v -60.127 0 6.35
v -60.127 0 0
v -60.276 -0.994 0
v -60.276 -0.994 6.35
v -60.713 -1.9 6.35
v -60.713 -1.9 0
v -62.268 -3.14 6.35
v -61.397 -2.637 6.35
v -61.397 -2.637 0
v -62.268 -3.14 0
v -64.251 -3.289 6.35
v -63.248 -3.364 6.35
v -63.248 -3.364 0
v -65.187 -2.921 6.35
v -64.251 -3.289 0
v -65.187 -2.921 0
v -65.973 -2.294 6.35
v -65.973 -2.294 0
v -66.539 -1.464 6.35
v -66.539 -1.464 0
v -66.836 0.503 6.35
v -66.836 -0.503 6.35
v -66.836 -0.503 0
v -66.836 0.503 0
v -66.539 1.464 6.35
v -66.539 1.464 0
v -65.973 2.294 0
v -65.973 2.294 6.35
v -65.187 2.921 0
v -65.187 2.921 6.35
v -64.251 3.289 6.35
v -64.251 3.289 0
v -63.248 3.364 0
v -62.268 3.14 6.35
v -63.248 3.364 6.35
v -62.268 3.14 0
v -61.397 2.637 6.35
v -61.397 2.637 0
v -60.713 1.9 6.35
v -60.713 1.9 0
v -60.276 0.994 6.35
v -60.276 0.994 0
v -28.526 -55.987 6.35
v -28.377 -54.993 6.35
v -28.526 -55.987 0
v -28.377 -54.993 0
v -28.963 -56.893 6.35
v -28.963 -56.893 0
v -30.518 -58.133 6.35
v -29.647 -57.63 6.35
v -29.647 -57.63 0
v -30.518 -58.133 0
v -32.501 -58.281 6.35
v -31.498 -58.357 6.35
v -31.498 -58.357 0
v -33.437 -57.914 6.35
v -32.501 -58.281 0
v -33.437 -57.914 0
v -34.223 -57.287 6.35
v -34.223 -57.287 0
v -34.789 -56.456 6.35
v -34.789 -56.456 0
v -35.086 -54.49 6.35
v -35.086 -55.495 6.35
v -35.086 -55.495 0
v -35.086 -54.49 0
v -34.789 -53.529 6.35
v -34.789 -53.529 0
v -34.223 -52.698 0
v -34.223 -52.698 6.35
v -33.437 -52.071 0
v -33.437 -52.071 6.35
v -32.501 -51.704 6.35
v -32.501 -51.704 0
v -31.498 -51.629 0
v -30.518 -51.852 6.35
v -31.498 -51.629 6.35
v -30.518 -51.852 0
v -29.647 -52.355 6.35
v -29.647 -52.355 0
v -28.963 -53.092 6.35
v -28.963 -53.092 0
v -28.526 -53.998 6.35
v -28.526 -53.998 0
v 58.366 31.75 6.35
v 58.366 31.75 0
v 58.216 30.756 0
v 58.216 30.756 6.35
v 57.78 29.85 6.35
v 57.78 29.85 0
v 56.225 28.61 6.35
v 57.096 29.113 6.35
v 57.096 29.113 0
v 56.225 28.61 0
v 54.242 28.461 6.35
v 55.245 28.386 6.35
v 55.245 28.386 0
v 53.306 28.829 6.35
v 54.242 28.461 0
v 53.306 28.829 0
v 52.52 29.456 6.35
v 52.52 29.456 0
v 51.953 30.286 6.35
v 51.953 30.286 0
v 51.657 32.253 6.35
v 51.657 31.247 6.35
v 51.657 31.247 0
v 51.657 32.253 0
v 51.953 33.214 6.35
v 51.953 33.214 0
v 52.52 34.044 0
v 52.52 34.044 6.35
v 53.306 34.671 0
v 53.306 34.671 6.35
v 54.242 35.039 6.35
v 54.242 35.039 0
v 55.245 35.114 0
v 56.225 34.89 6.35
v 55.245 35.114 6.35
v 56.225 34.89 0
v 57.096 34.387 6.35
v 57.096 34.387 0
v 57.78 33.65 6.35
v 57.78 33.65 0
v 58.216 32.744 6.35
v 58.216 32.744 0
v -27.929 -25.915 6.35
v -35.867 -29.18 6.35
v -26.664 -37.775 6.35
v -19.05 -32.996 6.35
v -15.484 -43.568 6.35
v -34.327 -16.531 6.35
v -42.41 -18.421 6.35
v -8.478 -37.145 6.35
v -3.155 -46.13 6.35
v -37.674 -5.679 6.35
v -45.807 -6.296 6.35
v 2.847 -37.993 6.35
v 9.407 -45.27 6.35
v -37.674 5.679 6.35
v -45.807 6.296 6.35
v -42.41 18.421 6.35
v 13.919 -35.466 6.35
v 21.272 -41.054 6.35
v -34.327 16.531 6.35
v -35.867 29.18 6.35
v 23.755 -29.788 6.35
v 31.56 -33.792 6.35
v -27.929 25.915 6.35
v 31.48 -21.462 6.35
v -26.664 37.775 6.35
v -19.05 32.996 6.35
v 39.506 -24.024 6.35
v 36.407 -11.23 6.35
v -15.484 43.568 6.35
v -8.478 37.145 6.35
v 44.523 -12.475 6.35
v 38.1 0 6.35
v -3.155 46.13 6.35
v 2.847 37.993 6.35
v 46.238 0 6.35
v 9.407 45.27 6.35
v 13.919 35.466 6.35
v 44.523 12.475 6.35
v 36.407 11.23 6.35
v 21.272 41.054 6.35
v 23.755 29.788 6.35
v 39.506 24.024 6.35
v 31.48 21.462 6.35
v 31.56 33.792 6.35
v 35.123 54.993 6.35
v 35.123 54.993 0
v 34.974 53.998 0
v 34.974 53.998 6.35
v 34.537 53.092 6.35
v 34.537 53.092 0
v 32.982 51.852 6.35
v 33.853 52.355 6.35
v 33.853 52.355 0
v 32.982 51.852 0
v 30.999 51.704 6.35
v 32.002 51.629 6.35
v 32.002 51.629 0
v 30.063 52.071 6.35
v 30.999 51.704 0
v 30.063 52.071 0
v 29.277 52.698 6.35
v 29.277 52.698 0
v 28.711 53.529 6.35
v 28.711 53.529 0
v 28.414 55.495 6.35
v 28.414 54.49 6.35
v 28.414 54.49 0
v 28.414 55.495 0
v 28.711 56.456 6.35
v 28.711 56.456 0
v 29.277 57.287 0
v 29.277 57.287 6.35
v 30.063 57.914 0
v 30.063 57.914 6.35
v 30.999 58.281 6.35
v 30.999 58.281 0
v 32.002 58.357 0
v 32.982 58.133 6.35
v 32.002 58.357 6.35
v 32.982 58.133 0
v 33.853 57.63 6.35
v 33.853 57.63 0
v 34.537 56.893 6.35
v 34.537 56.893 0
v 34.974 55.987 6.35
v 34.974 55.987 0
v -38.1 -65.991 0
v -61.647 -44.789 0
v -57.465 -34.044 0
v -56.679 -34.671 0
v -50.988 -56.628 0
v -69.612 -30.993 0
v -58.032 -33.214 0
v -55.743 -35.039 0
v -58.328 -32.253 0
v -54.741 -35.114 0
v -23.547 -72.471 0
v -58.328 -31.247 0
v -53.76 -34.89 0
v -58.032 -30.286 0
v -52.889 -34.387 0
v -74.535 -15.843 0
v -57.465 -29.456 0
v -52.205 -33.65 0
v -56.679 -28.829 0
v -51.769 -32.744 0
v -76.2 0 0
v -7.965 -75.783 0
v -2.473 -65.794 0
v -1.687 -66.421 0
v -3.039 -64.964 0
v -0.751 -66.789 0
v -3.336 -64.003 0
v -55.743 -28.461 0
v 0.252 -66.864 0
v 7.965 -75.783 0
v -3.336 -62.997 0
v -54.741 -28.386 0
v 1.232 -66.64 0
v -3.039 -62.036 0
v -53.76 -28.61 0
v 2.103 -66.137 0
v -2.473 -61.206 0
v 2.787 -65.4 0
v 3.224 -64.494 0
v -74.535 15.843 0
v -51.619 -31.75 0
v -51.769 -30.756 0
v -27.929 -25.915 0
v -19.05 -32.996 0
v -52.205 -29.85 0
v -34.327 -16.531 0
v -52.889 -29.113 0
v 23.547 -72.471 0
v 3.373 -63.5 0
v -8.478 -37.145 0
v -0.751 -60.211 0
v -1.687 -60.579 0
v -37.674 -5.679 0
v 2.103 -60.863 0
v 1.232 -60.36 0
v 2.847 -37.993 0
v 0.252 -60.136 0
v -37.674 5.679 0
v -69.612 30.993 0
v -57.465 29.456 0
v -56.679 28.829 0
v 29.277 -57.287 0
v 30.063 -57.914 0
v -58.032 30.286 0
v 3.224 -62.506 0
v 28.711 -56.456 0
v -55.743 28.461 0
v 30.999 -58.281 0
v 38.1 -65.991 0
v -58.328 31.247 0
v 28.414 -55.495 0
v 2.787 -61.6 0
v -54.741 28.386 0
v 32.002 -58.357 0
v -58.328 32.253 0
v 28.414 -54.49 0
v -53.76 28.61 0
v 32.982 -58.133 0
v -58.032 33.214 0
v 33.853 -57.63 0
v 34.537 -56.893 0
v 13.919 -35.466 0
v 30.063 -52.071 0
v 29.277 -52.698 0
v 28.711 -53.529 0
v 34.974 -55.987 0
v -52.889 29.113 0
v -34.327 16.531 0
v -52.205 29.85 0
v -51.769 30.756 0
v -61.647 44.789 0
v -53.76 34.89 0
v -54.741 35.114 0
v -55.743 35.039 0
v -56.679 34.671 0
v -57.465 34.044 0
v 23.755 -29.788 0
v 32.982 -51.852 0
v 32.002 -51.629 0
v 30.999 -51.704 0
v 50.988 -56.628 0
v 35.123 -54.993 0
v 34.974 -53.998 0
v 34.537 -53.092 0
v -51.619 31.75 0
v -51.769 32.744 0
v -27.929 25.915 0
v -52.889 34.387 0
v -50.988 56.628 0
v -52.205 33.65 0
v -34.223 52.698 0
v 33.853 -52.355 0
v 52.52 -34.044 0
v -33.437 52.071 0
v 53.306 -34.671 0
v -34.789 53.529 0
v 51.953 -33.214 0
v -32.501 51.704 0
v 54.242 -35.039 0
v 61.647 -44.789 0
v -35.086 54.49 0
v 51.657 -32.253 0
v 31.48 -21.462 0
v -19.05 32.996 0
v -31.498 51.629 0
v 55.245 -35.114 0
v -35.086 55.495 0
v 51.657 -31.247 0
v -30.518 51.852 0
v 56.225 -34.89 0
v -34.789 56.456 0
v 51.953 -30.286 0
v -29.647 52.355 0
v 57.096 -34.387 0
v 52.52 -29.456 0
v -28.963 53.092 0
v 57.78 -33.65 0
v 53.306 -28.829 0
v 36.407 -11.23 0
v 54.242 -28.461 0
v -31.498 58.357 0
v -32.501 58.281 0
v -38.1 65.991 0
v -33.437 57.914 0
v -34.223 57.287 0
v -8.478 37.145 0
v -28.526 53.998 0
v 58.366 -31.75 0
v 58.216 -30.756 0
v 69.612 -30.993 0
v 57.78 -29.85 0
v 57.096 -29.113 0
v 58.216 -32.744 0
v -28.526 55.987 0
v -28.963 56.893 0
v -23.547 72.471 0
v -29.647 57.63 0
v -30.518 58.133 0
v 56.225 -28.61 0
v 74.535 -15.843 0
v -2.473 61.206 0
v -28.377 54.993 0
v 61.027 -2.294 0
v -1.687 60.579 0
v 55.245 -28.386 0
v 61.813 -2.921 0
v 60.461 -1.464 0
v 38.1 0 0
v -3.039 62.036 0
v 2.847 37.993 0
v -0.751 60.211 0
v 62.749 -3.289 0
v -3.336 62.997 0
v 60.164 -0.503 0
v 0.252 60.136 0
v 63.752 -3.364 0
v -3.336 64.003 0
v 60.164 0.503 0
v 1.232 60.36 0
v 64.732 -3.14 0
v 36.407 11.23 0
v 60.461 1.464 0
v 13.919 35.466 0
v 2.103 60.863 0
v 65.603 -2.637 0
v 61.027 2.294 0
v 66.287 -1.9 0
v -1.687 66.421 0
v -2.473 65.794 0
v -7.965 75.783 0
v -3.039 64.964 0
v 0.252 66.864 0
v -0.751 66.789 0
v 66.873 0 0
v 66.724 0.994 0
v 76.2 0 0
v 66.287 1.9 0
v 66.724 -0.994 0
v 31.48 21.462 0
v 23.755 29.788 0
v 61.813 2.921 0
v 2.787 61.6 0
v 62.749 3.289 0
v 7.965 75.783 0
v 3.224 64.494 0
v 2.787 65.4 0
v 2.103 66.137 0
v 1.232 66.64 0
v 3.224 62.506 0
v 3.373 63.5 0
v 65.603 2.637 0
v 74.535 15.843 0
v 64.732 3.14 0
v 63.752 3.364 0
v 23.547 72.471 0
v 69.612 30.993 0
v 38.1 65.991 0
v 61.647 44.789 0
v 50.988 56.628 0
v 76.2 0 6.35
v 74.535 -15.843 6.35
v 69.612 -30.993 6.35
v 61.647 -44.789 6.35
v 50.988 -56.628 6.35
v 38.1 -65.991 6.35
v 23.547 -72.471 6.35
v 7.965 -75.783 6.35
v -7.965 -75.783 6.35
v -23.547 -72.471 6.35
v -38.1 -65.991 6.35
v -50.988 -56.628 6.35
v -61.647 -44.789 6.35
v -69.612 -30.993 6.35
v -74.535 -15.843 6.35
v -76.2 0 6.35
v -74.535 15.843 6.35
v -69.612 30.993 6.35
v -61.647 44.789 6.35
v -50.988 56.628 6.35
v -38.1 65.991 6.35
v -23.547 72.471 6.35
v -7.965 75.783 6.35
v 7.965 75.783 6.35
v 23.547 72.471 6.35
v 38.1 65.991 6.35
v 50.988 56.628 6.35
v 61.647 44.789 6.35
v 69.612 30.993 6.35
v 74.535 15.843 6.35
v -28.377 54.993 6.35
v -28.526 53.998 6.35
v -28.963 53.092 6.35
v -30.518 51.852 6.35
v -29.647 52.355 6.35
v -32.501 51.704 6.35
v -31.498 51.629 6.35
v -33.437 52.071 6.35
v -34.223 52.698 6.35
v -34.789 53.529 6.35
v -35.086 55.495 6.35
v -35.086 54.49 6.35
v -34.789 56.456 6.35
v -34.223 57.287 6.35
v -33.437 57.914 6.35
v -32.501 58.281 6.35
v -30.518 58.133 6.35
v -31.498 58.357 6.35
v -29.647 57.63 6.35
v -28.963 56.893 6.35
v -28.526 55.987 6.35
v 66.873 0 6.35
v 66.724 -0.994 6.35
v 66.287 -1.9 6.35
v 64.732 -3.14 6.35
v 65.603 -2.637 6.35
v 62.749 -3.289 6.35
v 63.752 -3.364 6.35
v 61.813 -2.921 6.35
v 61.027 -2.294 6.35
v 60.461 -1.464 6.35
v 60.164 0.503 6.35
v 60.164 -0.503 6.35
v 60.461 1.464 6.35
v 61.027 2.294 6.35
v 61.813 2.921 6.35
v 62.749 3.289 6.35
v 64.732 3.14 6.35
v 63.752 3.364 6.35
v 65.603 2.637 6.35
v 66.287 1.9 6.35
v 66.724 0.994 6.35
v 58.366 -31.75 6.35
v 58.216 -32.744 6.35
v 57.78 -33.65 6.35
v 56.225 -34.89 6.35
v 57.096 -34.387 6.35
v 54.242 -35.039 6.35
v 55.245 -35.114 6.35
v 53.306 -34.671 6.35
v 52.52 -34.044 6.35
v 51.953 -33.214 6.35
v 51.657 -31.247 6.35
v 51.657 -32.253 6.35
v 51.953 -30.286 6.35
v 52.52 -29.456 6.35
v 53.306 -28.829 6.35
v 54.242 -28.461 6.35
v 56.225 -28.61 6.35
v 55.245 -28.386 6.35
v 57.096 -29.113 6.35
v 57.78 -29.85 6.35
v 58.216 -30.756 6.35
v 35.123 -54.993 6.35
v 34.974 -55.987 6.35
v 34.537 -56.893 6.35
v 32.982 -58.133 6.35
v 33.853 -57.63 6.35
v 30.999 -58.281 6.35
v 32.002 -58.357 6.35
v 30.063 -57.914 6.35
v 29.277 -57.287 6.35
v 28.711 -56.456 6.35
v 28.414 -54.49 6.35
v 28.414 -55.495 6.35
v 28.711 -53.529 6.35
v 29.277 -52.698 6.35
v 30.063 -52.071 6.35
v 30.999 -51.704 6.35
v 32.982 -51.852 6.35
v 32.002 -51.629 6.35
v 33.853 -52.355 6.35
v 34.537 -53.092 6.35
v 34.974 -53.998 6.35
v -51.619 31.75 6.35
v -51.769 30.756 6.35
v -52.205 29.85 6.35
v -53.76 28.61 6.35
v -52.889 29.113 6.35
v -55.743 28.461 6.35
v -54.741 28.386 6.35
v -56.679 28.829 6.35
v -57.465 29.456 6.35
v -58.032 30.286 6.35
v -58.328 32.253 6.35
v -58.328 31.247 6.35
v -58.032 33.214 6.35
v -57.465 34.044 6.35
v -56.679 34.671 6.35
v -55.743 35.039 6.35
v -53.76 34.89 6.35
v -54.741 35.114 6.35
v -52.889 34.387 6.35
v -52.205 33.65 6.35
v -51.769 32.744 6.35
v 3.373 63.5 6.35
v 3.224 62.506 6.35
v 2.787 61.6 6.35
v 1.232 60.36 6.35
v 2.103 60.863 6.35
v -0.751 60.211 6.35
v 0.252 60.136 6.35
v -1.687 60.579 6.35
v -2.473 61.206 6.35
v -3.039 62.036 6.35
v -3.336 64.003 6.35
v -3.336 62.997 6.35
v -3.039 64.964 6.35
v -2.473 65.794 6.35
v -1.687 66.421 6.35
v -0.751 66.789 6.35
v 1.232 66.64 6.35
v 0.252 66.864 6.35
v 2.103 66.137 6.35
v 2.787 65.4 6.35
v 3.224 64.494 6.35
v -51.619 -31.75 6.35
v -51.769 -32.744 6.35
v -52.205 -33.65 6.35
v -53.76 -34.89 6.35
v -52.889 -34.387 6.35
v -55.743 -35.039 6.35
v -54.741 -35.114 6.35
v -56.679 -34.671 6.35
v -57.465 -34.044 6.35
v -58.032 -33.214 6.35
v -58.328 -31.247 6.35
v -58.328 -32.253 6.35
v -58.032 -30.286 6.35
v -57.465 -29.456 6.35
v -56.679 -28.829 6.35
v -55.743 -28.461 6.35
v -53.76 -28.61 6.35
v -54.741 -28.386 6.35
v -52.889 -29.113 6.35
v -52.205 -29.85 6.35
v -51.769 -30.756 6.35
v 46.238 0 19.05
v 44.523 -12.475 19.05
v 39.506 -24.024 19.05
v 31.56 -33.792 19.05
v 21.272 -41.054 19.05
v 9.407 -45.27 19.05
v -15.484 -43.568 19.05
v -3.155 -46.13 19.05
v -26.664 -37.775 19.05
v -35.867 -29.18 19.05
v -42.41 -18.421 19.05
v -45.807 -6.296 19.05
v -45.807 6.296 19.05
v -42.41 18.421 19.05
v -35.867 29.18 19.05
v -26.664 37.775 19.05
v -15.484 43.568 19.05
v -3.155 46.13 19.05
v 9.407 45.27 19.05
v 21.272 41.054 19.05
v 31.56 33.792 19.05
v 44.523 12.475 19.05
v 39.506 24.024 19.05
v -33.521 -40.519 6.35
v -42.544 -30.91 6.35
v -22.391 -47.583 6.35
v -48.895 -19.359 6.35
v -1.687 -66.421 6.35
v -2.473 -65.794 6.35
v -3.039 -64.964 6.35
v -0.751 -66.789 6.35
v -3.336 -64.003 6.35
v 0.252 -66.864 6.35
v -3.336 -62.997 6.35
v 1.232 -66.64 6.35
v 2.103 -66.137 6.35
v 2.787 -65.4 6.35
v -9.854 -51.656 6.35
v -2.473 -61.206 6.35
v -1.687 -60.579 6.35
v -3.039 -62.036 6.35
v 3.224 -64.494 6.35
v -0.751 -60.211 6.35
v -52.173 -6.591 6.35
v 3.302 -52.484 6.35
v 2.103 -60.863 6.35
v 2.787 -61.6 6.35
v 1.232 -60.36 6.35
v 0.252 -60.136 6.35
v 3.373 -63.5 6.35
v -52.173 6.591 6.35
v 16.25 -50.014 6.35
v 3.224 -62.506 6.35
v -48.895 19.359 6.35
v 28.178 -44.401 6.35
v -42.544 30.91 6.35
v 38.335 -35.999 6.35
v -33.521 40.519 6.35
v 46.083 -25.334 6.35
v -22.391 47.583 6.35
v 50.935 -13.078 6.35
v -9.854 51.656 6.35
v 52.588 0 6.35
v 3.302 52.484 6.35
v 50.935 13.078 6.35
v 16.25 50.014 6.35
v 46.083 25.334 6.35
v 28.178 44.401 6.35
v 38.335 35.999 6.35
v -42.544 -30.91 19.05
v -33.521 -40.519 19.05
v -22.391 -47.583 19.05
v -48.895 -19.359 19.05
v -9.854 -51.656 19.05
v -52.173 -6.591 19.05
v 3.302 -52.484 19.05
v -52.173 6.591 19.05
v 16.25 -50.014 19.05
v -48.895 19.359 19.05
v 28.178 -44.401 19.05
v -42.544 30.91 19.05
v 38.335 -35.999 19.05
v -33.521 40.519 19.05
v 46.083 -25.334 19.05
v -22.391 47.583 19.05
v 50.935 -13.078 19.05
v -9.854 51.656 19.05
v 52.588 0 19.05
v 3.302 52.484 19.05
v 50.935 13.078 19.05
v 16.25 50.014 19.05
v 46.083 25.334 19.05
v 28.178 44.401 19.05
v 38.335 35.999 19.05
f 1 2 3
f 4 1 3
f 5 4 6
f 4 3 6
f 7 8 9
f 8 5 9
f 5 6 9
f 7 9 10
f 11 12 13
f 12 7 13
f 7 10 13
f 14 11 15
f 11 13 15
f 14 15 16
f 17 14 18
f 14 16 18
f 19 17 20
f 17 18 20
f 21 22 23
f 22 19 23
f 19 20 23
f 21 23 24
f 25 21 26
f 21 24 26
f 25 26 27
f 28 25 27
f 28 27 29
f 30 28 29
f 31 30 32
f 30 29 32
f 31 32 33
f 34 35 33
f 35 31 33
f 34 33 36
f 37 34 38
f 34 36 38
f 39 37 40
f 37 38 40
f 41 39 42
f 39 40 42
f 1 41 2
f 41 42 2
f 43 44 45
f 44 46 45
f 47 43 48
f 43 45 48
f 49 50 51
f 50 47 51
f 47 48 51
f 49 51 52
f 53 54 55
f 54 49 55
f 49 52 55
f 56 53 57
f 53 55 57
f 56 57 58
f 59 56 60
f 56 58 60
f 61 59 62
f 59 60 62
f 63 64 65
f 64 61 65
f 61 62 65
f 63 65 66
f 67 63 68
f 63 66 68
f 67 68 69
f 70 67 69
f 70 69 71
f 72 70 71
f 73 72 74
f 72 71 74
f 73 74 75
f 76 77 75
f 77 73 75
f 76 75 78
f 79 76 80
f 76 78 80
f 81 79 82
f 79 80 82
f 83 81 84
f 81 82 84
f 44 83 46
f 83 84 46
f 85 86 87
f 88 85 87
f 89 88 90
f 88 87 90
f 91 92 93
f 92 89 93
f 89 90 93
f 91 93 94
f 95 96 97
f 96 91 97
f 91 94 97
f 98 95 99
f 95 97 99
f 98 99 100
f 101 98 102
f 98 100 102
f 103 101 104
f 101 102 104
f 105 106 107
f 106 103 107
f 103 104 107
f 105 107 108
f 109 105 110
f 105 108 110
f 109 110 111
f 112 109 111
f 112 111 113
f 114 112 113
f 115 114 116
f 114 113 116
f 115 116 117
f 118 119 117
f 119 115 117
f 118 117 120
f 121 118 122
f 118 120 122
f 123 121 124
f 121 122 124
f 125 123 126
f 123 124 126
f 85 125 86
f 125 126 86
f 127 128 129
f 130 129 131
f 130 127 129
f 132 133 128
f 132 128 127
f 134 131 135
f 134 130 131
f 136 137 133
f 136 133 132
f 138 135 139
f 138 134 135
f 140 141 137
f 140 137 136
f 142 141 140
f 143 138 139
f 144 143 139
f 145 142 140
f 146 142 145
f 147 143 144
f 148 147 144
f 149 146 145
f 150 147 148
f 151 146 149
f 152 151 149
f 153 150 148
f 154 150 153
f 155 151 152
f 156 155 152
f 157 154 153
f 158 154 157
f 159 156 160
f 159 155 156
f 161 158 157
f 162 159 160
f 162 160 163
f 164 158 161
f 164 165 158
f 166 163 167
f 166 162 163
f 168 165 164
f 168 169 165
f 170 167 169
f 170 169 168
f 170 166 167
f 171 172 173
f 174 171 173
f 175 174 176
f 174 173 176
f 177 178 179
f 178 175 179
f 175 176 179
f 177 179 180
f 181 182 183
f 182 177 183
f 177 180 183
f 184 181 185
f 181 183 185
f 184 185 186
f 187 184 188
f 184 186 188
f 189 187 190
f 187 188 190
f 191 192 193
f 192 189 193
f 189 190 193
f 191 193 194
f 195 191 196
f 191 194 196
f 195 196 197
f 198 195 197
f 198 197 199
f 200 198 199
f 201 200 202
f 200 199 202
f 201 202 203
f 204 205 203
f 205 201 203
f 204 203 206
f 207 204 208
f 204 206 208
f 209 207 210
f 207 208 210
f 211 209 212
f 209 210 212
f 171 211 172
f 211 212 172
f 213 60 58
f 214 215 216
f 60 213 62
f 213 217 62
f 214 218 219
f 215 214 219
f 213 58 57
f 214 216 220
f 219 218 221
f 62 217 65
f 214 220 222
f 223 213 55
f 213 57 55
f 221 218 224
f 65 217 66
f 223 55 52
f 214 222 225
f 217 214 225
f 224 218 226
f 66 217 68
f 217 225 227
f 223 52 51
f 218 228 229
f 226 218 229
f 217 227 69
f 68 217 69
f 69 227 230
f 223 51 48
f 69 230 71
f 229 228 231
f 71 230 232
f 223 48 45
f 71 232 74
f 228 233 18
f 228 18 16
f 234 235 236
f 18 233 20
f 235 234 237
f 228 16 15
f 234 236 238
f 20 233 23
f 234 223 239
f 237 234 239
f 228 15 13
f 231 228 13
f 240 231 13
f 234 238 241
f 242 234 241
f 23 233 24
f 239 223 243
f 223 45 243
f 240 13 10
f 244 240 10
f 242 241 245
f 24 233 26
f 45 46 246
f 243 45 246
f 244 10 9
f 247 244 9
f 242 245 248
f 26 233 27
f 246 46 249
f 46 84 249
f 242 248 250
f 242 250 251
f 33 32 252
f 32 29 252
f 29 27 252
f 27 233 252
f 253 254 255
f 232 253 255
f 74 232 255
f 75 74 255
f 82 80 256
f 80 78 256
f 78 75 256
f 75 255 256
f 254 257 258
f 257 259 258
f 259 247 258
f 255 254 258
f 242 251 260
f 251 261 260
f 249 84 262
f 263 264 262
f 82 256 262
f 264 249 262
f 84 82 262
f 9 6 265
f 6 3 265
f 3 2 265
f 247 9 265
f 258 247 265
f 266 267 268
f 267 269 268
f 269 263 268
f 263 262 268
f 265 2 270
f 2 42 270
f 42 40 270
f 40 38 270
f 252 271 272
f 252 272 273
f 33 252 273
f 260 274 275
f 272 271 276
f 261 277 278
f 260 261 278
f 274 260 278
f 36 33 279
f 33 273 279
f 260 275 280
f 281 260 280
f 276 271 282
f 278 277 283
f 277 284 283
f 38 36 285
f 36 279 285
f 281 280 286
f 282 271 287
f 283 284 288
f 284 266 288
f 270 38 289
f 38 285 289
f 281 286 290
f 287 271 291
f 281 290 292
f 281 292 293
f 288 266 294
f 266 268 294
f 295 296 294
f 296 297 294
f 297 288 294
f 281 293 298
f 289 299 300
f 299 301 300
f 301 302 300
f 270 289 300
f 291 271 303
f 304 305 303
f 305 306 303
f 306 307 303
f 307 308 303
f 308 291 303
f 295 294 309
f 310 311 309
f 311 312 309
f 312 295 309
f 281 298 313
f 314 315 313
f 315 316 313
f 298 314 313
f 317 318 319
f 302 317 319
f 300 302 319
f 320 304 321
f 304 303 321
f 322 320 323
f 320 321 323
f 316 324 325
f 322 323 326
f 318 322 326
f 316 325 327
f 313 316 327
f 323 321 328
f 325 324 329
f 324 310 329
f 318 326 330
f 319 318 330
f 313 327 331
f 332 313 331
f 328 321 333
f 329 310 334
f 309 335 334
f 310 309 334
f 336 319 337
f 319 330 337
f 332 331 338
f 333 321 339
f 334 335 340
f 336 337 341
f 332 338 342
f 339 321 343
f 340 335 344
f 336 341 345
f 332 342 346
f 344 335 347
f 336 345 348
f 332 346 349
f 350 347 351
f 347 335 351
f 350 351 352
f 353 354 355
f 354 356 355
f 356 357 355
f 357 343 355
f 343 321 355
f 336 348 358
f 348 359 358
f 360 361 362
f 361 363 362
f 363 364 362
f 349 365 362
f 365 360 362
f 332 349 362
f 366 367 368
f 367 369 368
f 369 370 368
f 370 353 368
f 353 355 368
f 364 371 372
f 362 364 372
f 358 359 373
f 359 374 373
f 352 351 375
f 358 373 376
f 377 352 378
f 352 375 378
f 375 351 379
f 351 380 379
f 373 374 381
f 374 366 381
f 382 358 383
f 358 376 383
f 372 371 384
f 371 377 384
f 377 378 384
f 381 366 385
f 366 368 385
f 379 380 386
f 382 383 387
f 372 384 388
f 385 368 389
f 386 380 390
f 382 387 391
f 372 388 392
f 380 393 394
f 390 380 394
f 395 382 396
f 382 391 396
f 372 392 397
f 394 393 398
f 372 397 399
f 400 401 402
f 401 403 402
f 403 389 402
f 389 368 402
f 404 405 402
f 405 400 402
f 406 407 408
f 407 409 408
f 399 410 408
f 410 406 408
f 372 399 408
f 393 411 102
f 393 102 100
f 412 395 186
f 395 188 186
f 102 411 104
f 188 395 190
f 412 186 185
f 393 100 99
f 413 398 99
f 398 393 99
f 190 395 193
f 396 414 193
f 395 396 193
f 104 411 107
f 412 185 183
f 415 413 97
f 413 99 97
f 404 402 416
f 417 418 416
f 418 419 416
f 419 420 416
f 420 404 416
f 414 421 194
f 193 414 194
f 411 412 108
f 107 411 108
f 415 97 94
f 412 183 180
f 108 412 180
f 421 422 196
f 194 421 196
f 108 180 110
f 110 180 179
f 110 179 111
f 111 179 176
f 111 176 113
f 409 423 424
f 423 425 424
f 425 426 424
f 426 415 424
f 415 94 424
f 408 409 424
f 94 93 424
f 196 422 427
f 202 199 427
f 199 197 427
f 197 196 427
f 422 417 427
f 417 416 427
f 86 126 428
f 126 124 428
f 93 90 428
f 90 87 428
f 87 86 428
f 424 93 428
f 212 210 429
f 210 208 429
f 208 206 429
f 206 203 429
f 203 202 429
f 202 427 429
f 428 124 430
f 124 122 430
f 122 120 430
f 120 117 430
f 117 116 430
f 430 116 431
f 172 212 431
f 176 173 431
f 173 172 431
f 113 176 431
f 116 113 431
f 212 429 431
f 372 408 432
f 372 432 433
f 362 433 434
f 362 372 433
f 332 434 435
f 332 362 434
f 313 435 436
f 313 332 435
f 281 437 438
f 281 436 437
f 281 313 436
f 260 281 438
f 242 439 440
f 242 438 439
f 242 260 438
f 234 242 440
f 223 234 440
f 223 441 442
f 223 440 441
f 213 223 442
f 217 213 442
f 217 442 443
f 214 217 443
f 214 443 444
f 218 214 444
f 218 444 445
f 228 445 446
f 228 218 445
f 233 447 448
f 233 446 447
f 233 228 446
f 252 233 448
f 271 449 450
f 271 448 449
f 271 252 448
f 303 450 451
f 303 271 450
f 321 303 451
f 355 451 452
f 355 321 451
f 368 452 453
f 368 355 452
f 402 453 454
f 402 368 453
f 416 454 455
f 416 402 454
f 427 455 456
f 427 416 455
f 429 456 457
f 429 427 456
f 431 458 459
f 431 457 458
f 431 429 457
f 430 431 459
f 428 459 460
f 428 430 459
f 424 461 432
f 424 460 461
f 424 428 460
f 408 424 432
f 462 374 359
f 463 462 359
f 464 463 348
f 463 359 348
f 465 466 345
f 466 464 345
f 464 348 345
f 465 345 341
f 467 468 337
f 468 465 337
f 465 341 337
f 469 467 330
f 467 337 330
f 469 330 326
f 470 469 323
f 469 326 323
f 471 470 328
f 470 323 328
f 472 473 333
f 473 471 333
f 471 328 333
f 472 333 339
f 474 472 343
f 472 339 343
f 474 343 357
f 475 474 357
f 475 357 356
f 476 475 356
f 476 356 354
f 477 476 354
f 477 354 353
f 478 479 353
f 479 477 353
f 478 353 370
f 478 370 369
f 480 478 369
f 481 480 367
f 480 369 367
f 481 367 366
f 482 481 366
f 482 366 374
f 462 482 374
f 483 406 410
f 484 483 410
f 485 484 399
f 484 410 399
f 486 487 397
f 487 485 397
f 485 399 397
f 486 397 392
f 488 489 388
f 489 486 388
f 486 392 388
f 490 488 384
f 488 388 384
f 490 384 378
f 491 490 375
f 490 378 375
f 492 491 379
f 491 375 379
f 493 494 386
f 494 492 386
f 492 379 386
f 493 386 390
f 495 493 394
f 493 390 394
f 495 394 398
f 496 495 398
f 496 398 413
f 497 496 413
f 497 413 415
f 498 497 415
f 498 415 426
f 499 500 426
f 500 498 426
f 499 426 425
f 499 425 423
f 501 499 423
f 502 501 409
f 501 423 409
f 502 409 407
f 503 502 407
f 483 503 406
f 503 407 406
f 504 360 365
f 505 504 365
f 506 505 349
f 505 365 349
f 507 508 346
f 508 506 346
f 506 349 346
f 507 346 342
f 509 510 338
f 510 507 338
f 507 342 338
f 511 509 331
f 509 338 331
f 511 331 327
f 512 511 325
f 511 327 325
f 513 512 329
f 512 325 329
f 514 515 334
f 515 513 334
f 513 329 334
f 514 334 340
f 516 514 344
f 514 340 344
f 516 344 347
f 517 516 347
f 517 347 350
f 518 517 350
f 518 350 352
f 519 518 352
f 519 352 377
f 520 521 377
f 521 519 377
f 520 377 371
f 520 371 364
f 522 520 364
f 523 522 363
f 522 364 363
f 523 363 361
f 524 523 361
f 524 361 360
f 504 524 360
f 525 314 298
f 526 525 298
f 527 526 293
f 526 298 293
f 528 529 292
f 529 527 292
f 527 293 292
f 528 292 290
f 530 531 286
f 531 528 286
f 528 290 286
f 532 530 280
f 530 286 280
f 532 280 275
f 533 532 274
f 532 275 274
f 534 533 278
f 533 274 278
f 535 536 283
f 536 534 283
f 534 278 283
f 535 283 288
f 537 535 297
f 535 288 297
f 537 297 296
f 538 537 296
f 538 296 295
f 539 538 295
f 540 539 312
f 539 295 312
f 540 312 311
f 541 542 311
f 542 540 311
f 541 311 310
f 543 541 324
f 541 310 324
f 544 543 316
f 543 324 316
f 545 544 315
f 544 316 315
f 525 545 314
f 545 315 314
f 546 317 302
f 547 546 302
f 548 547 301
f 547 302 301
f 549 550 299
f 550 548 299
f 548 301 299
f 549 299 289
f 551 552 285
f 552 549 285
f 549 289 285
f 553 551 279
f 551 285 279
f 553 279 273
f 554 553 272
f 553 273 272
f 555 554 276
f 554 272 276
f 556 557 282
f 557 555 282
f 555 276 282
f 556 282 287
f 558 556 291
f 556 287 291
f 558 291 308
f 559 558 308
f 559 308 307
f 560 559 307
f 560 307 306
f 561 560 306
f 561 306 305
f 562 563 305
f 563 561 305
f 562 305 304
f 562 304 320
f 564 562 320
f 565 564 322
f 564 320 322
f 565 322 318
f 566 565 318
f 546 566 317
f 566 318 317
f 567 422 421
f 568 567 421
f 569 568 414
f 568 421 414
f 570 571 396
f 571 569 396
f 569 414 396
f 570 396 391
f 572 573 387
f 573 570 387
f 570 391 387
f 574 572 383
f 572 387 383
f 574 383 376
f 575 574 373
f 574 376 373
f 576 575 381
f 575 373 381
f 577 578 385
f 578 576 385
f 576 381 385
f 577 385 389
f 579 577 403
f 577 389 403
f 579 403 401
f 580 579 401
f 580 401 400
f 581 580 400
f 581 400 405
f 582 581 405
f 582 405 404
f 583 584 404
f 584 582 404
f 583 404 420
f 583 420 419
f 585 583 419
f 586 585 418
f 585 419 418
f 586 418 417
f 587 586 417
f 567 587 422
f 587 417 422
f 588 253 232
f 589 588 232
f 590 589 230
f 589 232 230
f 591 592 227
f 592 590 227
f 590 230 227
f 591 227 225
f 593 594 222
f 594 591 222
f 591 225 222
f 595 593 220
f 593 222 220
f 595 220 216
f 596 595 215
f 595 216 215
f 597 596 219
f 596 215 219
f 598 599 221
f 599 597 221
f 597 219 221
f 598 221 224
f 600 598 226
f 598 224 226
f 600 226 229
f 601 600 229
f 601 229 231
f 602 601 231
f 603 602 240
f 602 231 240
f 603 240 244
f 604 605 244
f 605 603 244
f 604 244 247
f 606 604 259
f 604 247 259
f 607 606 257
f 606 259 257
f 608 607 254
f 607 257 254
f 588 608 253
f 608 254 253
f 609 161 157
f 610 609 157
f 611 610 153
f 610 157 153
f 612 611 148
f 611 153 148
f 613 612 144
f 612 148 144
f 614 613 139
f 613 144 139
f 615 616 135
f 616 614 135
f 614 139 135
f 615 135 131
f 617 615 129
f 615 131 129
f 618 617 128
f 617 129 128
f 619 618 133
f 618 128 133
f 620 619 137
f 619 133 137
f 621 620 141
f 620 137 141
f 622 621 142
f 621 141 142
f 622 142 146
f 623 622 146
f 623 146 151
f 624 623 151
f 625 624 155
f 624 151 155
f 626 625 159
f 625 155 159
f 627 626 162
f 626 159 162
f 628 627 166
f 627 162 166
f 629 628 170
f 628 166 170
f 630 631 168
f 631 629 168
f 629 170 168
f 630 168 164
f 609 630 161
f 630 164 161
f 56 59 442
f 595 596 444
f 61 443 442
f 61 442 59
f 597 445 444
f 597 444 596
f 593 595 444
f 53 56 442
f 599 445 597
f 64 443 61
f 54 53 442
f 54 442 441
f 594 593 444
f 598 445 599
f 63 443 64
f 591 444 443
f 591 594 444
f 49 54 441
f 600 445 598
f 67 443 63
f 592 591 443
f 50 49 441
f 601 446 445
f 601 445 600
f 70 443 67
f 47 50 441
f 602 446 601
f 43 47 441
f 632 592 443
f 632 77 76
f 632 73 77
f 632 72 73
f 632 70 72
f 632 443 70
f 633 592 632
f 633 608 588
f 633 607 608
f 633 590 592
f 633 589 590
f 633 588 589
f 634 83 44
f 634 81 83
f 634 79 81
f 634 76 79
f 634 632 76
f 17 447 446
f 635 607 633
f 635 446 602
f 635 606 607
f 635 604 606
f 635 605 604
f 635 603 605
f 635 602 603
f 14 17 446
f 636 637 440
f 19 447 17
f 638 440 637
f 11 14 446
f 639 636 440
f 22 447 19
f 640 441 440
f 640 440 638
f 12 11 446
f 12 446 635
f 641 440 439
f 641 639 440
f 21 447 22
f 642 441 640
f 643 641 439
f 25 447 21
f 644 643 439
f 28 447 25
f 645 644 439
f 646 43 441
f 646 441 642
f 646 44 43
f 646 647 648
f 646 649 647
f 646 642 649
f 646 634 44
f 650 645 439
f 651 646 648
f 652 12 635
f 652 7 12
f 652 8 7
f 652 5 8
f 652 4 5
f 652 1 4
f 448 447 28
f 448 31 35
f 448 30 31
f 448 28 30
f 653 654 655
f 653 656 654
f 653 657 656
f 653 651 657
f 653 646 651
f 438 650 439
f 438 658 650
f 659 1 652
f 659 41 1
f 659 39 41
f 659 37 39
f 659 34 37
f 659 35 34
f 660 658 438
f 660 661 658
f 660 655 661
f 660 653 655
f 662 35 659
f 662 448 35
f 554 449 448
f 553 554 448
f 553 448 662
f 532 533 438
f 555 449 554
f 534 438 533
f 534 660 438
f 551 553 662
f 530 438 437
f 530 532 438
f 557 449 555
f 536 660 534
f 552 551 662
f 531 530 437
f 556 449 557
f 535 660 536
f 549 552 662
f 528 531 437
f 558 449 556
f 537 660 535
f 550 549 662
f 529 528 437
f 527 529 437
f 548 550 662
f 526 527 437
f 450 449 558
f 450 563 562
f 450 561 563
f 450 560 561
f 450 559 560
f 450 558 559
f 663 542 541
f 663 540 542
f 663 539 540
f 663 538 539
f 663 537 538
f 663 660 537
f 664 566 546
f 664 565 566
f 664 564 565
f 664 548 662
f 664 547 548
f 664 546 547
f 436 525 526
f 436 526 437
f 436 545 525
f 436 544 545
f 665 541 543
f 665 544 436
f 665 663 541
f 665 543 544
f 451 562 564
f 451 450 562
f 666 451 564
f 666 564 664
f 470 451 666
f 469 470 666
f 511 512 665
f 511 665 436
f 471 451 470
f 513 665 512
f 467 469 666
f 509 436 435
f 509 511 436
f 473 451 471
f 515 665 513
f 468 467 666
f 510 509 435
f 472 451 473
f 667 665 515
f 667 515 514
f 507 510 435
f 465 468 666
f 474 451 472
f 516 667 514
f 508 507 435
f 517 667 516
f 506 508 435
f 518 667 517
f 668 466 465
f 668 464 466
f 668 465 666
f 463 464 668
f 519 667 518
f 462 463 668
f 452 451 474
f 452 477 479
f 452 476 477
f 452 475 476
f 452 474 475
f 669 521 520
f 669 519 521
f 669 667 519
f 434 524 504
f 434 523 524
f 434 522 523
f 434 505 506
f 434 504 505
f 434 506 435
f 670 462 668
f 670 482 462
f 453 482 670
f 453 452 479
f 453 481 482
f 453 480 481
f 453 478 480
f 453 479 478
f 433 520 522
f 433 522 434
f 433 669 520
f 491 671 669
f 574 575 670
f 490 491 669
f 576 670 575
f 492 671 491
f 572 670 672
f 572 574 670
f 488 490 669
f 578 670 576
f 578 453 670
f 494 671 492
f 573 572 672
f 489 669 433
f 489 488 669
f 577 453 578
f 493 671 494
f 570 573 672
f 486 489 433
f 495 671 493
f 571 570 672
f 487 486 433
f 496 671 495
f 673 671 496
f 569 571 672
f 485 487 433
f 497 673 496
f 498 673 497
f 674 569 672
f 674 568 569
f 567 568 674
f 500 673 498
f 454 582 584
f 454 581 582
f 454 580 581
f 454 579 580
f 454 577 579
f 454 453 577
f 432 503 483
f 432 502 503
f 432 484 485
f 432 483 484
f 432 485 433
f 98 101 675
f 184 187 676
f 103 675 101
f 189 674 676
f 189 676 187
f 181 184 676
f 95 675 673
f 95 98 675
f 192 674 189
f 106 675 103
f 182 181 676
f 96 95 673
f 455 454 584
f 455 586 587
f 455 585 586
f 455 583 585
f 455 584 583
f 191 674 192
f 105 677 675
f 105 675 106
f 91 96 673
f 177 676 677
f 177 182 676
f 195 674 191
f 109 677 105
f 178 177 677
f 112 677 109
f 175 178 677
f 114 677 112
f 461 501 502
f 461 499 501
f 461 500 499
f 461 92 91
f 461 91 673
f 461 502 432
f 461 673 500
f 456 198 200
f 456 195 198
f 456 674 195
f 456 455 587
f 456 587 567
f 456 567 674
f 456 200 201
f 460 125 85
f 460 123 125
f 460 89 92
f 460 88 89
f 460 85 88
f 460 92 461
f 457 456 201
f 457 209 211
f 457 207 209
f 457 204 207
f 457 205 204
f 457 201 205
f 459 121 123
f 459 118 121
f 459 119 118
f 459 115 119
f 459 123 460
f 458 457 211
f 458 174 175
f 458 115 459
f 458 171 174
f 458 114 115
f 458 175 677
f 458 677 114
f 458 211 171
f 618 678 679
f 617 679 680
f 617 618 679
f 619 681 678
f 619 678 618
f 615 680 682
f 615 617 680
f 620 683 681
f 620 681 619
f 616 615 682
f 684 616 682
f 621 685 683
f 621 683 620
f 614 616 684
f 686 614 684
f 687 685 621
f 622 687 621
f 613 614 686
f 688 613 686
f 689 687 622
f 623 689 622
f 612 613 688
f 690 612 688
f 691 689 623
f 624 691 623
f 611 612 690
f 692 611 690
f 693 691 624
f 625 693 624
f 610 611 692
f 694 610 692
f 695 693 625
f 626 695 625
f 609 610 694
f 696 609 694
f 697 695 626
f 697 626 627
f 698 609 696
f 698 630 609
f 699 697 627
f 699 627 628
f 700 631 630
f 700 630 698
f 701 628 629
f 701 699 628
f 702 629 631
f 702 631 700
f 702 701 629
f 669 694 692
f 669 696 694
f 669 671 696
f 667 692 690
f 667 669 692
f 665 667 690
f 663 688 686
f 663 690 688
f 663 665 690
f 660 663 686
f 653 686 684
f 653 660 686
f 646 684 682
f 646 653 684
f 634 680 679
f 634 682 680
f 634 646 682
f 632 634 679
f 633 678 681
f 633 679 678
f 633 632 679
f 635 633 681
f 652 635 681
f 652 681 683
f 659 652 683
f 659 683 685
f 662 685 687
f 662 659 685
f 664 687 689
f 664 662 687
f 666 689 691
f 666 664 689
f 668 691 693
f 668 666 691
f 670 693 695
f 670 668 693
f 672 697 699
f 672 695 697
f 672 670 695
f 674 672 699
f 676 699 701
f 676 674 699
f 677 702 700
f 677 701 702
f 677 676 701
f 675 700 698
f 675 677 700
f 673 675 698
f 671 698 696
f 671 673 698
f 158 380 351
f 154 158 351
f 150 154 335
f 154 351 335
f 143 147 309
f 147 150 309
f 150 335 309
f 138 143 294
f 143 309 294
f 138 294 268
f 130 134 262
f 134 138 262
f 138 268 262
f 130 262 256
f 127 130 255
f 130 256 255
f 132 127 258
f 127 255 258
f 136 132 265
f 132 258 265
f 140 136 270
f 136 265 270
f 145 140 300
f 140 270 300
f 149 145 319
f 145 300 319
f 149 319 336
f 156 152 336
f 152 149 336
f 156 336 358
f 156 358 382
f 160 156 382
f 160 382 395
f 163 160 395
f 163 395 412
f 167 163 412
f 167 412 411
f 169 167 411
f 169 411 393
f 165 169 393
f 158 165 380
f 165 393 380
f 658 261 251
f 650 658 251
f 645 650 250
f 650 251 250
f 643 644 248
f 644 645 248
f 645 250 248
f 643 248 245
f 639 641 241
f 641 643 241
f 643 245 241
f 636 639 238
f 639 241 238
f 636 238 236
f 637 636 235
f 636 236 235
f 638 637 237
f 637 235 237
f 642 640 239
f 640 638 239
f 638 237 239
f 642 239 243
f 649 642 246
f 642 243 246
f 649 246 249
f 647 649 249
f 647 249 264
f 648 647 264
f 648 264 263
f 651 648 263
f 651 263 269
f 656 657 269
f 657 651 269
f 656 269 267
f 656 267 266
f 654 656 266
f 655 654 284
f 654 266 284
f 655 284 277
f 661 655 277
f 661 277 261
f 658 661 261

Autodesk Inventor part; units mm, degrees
ref_plane "YZ Plane" through (0, 0, 0) normal (1, 0, 0) x (0, 1, 0)
ref_plane "XZ Plane" through (0, 0, 0) normal (0, 1, 0) x (-1, 0, 0)
ref_plane "XY Plane" through (0, 0, 0) normal (0, 0, 1) x (1, 0, 0)
sketch "Sketch1" plane through (0, 0, 0) normal (0, 0, 1) x (1, 0, 0)
  circle A0 centre (0, 0) radius 76.2
  circle A1 centre (0, 63.5) radius 3.3734
  circle A2 centre (0, 0) radius 38.1
  circle A3 centre (-31.75, 54.9926) radius 3.3734
  circle A4 centre (-54.9926, 31.75) radius 3.3734
  circle A5 centre (-63.5, 0) radius 3.3734
  circle A6 centre (-54.9926, -31.75) radius 3.3734
  circle A7 centre (-31.75, -54.9926) radius 3.3734
  circle A8 centre (0, -63.5) radius 3.3734
  circle A9 centre (31.75, -54.9926) radius 3.3734
  circle A10 centre (54.9926, -31.75) radius 3.3734
  circle A11 centre (63.5, 0) radius 3.3734
  circle A12 centre (54.9926, 31.75) radius 3.3734
  circle A13 centre (31.75, 54.9926) radius 3.3734
  dimension "d0" = 63.5
  dimension "d1" = 152.4
  dimension "d2" = 6.7469
  dimension "d3" = 76.2
  dimension "d6" = 360
extrude "Extrusion1" add sketch "Sketch1" along normal blind 6.35
sketch "Sketch2" plane through (0, 0, 6.35) normal (0, 0, 1) x (1, 0, 0)
  circle A0 centre (0, 0) radius 46.2375
  circle A1 centre (0, 0) radius 52.5875
  dimension "d10" = 92.475
  dimension "d11" = 6.35
extrude "Extrusion2" add sketch "Sketch2" along normal blind 12.7
